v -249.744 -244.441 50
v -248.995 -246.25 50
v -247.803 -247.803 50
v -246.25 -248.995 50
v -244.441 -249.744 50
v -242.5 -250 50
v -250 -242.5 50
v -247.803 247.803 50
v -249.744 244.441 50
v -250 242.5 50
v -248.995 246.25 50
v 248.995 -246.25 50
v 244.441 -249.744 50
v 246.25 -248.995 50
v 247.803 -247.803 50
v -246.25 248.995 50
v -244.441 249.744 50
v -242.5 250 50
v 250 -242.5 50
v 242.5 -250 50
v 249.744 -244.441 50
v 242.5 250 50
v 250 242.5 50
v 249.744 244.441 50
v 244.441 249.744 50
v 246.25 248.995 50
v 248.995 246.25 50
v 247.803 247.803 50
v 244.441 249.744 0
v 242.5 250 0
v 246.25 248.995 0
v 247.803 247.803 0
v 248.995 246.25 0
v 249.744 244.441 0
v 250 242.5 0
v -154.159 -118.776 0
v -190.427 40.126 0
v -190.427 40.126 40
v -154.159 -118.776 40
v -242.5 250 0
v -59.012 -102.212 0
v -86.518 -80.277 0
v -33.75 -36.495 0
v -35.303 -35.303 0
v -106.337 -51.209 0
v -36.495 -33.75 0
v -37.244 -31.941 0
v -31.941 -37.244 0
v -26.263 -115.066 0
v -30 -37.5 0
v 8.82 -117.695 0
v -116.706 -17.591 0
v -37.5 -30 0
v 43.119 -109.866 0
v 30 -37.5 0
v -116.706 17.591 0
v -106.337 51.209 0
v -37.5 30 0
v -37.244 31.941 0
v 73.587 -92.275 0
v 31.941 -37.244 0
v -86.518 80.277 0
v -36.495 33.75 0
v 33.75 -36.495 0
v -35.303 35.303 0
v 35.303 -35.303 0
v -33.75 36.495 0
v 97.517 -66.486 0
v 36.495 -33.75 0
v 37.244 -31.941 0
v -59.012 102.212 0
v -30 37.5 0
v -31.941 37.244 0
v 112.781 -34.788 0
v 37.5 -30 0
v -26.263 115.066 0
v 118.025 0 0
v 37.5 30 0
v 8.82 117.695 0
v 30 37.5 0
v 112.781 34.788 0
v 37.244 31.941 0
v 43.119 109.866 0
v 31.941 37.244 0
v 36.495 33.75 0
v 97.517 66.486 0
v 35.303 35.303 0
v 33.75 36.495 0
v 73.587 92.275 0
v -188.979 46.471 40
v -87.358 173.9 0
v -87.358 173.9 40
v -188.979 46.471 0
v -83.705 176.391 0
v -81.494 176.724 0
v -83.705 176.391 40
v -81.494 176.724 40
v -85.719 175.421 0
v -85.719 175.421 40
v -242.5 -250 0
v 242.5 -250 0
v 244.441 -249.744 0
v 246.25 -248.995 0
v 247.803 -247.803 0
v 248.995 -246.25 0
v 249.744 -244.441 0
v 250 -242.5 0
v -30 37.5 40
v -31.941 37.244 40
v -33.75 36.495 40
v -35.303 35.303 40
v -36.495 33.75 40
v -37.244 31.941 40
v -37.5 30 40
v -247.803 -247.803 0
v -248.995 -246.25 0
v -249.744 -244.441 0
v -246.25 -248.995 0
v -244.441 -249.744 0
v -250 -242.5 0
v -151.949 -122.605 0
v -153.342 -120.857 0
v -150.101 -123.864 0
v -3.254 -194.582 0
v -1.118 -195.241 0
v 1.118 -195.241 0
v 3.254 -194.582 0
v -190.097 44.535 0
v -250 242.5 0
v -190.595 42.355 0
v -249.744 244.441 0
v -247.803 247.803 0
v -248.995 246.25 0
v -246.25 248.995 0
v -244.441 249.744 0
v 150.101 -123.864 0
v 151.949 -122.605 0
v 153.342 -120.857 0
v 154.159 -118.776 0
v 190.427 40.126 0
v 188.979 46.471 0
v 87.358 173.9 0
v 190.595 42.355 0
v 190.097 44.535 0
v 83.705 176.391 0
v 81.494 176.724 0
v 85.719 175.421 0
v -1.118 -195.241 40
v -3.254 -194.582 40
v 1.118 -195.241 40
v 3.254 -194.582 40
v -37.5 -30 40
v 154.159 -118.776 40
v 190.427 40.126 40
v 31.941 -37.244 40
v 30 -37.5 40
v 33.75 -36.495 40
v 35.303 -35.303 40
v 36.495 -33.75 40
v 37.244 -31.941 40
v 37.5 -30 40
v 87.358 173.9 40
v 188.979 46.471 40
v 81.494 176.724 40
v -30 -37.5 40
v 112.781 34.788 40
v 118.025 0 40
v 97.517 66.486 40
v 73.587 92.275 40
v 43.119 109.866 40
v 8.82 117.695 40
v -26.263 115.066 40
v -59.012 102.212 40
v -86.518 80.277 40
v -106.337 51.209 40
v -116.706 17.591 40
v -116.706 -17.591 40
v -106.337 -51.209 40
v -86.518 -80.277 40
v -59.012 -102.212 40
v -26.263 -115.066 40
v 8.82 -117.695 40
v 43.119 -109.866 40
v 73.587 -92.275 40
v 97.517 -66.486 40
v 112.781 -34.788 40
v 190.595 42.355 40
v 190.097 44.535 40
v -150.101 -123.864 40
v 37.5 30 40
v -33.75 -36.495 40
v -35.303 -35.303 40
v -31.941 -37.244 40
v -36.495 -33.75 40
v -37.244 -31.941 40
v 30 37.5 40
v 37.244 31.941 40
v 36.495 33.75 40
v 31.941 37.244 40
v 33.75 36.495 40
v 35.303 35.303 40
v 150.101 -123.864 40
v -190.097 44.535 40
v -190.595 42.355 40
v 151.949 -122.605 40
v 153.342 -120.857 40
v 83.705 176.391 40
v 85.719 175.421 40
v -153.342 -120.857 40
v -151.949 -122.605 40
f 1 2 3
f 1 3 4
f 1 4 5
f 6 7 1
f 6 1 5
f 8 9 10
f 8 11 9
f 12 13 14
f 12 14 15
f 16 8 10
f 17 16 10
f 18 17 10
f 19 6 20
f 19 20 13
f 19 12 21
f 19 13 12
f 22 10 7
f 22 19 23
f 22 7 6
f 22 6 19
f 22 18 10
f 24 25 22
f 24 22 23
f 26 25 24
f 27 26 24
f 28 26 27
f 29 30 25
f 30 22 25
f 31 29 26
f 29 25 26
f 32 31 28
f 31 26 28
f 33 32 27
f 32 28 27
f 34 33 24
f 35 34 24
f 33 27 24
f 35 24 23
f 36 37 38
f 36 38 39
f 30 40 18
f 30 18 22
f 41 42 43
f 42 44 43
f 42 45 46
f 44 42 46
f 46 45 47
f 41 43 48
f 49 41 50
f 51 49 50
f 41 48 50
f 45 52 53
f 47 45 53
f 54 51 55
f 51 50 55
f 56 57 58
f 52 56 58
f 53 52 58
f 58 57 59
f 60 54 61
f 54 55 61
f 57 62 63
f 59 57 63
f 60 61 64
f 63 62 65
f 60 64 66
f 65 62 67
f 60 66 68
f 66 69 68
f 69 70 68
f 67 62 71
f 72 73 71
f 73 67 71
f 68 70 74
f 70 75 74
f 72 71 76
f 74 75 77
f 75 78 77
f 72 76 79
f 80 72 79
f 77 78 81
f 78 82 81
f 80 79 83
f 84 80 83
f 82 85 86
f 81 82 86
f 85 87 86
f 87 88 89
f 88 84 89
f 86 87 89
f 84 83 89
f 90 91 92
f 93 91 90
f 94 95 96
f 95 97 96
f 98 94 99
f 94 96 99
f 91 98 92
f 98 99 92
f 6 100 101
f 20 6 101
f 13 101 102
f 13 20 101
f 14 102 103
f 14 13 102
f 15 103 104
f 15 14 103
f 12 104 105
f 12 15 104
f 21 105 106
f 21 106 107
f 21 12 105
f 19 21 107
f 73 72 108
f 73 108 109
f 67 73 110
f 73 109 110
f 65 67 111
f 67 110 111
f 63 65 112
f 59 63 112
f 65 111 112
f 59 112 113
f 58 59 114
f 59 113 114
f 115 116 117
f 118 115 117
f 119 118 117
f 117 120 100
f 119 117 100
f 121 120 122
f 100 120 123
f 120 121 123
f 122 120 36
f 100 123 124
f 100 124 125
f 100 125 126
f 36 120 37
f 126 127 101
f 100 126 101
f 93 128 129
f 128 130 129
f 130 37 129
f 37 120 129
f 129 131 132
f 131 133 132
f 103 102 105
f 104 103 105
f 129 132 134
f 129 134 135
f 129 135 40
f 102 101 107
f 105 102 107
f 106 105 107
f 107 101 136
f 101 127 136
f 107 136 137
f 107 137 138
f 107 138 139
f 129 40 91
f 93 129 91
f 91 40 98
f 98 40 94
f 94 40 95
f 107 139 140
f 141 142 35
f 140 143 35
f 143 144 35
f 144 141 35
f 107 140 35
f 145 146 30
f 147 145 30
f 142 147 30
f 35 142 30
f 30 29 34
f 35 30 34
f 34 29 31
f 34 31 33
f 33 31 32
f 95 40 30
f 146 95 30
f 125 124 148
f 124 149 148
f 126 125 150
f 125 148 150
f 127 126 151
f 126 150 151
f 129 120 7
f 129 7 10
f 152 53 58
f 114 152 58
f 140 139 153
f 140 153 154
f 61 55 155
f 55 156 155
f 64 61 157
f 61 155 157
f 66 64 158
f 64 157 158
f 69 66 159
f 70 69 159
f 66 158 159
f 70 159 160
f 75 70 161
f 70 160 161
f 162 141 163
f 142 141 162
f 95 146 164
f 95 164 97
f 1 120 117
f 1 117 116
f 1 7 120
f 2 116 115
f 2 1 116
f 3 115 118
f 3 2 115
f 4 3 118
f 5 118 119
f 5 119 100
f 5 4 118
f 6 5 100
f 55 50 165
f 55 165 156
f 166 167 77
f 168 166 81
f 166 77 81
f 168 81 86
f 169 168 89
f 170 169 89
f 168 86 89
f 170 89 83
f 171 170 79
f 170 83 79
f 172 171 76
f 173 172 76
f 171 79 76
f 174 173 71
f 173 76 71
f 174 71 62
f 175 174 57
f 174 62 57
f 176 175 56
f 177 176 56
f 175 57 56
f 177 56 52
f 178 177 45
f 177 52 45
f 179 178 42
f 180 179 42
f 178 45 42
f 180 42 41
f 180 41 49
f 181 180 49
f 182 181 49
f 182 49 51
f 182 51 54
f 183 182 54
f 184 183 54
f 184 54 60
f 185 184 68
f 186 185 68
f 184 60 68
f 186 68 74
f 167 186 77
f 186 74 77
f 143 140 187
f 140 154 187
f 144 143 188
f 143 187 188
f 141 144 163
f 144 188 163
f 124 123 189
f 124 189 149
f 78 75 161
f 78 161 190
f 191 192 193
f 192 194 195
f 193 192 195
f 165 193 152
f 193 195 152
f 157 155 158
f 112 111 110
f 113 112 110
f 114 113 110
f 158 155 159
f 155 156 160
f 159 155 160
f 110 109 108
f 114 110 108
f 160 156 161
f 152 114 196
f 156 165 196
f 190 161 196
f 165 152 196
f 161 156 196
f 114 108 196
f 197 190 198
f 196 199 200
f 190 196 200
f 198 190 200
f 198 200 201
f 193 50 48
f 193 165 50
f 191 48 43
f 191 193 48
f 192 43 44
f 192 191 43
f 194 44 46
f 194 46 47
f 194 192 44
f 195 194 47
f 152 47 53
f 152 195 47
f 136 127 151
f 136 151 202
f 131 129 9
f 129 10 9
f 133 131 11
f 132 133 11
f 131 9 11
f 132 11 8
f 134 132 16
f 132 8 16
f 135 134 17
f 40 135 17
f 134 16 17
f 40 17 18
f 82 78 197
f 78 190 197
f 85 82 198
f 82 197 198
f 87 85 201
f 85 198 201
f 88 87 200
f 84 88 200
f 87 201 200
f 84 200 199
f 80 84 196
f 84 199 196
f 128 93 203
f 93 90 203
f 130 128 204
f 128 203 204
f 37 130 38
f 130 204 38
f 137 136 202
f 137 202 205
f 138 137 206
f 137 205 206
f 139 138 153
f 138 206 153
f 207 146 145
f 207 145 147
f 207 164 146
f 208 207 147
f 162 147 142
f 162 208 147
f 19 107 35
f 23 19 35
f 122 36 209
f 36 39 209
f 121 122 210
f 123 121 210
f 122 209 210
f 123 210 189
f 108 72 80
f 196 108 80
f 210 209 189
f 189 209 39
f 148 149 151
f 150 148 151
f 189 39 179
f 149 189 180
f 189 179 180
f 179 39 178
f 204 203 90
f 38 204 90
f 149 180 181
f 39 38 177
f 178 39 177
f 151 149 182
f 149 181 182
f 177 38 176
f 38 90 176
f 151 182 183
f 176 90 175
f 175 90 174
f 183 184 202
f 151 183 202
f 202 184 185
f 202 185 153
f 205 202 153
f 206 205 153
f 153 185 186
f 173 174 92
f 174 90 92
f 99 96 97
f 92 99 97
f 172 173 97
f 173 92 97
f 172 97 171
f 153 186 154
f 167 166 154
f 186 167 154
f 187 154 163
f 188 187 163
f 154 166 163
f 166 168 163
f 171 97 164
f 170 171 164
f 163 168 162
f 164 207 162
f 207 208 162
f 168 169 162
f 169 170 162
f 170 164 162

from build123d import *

# Parameters (mm, degrees)
F0_W     = 500
F0_H     = 500
F0_R     = 118.0247003556
F0_W_2   = 75
F0_H_2   = 75
F1_DEPTH = 50
F2_DEPTH = 40
F3_R     = 7.5


with BuildPart() as f1:
    # F0 (on Top) → F1 (new body)
    with BuildSketch(Plane.XY):
        Rectangle(F0_W, F0_H)
        Polygon((-191.2311762839, 43.6472680867), (-85.1058798965, 176.7241805792), (85.1058798965, 176.7241805792), (191.2311762839, 43.6472680867), (153.3554965244, -122.296927517), (0, -196.1490422978), (-153.3554965244, -122.296927517), align=None, mode=Mode.SUBTRACT)
        Polygon((85.1058798965, 176.7241805792), (-85.1058798965, 176.7241805792), (-191.2311762839, 43.6472680867), (-153.3554965244, -122.296927517), (0, -196.1490422978), (153.3554965244, -122.296927517), (191.2311762839, 43.6472680867), align=None)
        Circle(F0_R, mode=Mode.SUBTRACT)
        Circle(F0_R)
        Rectangle(F0_W_2, F0_H_2, mode=Mode.SUBTRACT)
        Rectangle(F0_W_2, F0_H_2)
    extrude(amount=F1_DEPTH)

    # F0 (on Top) → F2 (cut)
    with BuildSketch(Plane.XY):
        Polygon((85.1058798965, 176.7241805792), (-85.1058798965, 176.7241805792), (-191.2311762839, 43.6472680867), (-153.3554965244, -122.296927517), (0, -196.1490422978), (153.3554965244, -122.296927517), (191.2311762839, 43.6472680867), align=None)
        Circle(F0_R, mode=Mode.SUBTRACT)
        Rectangle(F0_W_2, F0_H_2)
    extrude(amount=F2_DEPTH, mode=Mode.SUBTRACT)

    # F3
    f3_edges = [f1.edges().sort_by_distance(p)[0] for p in [
        (250, -250, 25),
        (-250, -250, 25),
        (-250, 250, 25),
        (250, 250, 25),
        (0, -196.149042, 20),
        (-153.355497, -122.296928, 20),
        (153.355497, -122.296928, 20),
        (191.231176, 43.647268, 20),
        (85.10588, 176.724181, 20),
        (-85.10588, 176.724181, 20),
        (-191.231176, 43.647268, 20),
        (-37.5, -37.5, 20),
        (37.5, -37.5, 20),
        (37.5, 37.5, 20),
        (-37.5, 37.5, 20),
    ]]
    fillet(f3_edges, radius=F3_R)


solid = f1.part
